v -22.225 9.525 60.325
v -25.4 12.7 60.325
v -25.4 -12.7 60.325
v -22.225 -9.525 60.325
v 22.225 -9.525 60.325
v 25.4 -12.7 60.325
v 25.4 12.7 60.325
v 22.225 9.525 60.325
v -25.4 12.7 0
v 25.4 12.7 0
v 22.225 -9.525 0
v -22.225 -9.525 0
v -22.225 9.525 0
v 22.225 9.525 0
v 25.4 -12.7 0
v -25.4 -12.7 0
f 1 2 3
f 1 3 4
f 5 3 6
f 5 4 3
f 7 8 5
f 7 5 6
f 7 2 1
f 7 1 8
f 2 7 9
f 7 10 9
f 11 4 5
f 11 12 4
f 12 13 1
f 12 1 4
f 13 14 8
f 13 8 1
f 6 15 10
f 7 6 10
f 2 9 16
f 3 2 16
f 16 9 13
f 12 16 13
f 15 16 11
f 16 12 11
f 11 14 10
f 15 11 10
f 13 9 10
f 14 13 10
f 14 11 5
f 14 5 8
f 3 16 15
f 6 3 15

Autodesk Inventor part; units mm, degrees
ref_plane "Start Plane" through (0, 0, 0) normal (0, 0, 1) x (1, 0, 0)
ref_plane "End Plane" through (0, 0, 60.325) normal (0, 0, 1) x (1, 0, 0)
sketch "Sketch" plane through (0, 0, 0) normal (0, 0, 1) x (1, 0, 0)
  line L0 (-25.4, -12.7) -> (25.4, -12.7)
  line L1 (25.4, -12.7) -> (25.4, 12.7)
  line L2 (25.4, 12.7) -> (-25.4, 12.7)
  line L3 (-25.4, 12.7) -> (-25.4, -12.7)
  line L4 (-25.4, -12.7) -> (25.4, 12.7) construction
  line L5 (25.4, -12.7) -> (-25.4, 12.7) construction
  line L6 (-22.225, -9.525) -> (22.225, -9.525)
  line L7 (22.225, -9.525) -> (22.225, 9.525)
  line L8 (22.225, 9.525) -> (-22.225, 9.525)
  line L9 (-22.225, 9.525) -> (-22.225, -9.525)
  line L10 (-22.225, -9.525) -> (22.225, 9.525) construction
  line L11 (22.225, -9.525) -> (-22.225, 9.525) construction
  point P0 (0, 0)
  point P1 (0, 0)
  dimension "d0" = 50.8
  dimension "d1" = 25.4
  dimension "d2" = 3.175
  dimension "d3" = 3.175
extrude "Body" add sketch "Sketch" along normal up to surface (60.325 mm away) from surface at 0
sketch "Sketch4" plane through (0, 0, 0) normal (0, 0, 1) x (1, 0, 0)
  line L0 (0, 0) -> (10, 0)
ref_plane "Work Plane4" through (0, 0, 0) normal (0, -1, 0) x (1, 0, 0)
sketch "Sketch5" plane through (0, 0, 0) normal (0, -1, 0) x (1, 0, 0)
  line L0 (-2, 0) -> (12, 0)
  line L1 (-2, 60.325) -> (12, 60.325)
  dimension "d11" = 60.325
ref_plane "Work Plane5" through (-25.4, 419.1, 60.325) normal (0, 0, 1) x (1, 0, 0)
split "Split1" plane through (-25.4, 419.1, 60.325) removes the side toward (0, 0, 1)
equation "\"G_OFFSET_START\" = 0"
equation "\"G_OFFSET_END\" = -12.7"
equation "\"d7\" = length + G_OFFSET_END"
equation "\"G_L\" = d11"
equation "\"length\" = 73.025"
properties part number "2x1inTubing"
